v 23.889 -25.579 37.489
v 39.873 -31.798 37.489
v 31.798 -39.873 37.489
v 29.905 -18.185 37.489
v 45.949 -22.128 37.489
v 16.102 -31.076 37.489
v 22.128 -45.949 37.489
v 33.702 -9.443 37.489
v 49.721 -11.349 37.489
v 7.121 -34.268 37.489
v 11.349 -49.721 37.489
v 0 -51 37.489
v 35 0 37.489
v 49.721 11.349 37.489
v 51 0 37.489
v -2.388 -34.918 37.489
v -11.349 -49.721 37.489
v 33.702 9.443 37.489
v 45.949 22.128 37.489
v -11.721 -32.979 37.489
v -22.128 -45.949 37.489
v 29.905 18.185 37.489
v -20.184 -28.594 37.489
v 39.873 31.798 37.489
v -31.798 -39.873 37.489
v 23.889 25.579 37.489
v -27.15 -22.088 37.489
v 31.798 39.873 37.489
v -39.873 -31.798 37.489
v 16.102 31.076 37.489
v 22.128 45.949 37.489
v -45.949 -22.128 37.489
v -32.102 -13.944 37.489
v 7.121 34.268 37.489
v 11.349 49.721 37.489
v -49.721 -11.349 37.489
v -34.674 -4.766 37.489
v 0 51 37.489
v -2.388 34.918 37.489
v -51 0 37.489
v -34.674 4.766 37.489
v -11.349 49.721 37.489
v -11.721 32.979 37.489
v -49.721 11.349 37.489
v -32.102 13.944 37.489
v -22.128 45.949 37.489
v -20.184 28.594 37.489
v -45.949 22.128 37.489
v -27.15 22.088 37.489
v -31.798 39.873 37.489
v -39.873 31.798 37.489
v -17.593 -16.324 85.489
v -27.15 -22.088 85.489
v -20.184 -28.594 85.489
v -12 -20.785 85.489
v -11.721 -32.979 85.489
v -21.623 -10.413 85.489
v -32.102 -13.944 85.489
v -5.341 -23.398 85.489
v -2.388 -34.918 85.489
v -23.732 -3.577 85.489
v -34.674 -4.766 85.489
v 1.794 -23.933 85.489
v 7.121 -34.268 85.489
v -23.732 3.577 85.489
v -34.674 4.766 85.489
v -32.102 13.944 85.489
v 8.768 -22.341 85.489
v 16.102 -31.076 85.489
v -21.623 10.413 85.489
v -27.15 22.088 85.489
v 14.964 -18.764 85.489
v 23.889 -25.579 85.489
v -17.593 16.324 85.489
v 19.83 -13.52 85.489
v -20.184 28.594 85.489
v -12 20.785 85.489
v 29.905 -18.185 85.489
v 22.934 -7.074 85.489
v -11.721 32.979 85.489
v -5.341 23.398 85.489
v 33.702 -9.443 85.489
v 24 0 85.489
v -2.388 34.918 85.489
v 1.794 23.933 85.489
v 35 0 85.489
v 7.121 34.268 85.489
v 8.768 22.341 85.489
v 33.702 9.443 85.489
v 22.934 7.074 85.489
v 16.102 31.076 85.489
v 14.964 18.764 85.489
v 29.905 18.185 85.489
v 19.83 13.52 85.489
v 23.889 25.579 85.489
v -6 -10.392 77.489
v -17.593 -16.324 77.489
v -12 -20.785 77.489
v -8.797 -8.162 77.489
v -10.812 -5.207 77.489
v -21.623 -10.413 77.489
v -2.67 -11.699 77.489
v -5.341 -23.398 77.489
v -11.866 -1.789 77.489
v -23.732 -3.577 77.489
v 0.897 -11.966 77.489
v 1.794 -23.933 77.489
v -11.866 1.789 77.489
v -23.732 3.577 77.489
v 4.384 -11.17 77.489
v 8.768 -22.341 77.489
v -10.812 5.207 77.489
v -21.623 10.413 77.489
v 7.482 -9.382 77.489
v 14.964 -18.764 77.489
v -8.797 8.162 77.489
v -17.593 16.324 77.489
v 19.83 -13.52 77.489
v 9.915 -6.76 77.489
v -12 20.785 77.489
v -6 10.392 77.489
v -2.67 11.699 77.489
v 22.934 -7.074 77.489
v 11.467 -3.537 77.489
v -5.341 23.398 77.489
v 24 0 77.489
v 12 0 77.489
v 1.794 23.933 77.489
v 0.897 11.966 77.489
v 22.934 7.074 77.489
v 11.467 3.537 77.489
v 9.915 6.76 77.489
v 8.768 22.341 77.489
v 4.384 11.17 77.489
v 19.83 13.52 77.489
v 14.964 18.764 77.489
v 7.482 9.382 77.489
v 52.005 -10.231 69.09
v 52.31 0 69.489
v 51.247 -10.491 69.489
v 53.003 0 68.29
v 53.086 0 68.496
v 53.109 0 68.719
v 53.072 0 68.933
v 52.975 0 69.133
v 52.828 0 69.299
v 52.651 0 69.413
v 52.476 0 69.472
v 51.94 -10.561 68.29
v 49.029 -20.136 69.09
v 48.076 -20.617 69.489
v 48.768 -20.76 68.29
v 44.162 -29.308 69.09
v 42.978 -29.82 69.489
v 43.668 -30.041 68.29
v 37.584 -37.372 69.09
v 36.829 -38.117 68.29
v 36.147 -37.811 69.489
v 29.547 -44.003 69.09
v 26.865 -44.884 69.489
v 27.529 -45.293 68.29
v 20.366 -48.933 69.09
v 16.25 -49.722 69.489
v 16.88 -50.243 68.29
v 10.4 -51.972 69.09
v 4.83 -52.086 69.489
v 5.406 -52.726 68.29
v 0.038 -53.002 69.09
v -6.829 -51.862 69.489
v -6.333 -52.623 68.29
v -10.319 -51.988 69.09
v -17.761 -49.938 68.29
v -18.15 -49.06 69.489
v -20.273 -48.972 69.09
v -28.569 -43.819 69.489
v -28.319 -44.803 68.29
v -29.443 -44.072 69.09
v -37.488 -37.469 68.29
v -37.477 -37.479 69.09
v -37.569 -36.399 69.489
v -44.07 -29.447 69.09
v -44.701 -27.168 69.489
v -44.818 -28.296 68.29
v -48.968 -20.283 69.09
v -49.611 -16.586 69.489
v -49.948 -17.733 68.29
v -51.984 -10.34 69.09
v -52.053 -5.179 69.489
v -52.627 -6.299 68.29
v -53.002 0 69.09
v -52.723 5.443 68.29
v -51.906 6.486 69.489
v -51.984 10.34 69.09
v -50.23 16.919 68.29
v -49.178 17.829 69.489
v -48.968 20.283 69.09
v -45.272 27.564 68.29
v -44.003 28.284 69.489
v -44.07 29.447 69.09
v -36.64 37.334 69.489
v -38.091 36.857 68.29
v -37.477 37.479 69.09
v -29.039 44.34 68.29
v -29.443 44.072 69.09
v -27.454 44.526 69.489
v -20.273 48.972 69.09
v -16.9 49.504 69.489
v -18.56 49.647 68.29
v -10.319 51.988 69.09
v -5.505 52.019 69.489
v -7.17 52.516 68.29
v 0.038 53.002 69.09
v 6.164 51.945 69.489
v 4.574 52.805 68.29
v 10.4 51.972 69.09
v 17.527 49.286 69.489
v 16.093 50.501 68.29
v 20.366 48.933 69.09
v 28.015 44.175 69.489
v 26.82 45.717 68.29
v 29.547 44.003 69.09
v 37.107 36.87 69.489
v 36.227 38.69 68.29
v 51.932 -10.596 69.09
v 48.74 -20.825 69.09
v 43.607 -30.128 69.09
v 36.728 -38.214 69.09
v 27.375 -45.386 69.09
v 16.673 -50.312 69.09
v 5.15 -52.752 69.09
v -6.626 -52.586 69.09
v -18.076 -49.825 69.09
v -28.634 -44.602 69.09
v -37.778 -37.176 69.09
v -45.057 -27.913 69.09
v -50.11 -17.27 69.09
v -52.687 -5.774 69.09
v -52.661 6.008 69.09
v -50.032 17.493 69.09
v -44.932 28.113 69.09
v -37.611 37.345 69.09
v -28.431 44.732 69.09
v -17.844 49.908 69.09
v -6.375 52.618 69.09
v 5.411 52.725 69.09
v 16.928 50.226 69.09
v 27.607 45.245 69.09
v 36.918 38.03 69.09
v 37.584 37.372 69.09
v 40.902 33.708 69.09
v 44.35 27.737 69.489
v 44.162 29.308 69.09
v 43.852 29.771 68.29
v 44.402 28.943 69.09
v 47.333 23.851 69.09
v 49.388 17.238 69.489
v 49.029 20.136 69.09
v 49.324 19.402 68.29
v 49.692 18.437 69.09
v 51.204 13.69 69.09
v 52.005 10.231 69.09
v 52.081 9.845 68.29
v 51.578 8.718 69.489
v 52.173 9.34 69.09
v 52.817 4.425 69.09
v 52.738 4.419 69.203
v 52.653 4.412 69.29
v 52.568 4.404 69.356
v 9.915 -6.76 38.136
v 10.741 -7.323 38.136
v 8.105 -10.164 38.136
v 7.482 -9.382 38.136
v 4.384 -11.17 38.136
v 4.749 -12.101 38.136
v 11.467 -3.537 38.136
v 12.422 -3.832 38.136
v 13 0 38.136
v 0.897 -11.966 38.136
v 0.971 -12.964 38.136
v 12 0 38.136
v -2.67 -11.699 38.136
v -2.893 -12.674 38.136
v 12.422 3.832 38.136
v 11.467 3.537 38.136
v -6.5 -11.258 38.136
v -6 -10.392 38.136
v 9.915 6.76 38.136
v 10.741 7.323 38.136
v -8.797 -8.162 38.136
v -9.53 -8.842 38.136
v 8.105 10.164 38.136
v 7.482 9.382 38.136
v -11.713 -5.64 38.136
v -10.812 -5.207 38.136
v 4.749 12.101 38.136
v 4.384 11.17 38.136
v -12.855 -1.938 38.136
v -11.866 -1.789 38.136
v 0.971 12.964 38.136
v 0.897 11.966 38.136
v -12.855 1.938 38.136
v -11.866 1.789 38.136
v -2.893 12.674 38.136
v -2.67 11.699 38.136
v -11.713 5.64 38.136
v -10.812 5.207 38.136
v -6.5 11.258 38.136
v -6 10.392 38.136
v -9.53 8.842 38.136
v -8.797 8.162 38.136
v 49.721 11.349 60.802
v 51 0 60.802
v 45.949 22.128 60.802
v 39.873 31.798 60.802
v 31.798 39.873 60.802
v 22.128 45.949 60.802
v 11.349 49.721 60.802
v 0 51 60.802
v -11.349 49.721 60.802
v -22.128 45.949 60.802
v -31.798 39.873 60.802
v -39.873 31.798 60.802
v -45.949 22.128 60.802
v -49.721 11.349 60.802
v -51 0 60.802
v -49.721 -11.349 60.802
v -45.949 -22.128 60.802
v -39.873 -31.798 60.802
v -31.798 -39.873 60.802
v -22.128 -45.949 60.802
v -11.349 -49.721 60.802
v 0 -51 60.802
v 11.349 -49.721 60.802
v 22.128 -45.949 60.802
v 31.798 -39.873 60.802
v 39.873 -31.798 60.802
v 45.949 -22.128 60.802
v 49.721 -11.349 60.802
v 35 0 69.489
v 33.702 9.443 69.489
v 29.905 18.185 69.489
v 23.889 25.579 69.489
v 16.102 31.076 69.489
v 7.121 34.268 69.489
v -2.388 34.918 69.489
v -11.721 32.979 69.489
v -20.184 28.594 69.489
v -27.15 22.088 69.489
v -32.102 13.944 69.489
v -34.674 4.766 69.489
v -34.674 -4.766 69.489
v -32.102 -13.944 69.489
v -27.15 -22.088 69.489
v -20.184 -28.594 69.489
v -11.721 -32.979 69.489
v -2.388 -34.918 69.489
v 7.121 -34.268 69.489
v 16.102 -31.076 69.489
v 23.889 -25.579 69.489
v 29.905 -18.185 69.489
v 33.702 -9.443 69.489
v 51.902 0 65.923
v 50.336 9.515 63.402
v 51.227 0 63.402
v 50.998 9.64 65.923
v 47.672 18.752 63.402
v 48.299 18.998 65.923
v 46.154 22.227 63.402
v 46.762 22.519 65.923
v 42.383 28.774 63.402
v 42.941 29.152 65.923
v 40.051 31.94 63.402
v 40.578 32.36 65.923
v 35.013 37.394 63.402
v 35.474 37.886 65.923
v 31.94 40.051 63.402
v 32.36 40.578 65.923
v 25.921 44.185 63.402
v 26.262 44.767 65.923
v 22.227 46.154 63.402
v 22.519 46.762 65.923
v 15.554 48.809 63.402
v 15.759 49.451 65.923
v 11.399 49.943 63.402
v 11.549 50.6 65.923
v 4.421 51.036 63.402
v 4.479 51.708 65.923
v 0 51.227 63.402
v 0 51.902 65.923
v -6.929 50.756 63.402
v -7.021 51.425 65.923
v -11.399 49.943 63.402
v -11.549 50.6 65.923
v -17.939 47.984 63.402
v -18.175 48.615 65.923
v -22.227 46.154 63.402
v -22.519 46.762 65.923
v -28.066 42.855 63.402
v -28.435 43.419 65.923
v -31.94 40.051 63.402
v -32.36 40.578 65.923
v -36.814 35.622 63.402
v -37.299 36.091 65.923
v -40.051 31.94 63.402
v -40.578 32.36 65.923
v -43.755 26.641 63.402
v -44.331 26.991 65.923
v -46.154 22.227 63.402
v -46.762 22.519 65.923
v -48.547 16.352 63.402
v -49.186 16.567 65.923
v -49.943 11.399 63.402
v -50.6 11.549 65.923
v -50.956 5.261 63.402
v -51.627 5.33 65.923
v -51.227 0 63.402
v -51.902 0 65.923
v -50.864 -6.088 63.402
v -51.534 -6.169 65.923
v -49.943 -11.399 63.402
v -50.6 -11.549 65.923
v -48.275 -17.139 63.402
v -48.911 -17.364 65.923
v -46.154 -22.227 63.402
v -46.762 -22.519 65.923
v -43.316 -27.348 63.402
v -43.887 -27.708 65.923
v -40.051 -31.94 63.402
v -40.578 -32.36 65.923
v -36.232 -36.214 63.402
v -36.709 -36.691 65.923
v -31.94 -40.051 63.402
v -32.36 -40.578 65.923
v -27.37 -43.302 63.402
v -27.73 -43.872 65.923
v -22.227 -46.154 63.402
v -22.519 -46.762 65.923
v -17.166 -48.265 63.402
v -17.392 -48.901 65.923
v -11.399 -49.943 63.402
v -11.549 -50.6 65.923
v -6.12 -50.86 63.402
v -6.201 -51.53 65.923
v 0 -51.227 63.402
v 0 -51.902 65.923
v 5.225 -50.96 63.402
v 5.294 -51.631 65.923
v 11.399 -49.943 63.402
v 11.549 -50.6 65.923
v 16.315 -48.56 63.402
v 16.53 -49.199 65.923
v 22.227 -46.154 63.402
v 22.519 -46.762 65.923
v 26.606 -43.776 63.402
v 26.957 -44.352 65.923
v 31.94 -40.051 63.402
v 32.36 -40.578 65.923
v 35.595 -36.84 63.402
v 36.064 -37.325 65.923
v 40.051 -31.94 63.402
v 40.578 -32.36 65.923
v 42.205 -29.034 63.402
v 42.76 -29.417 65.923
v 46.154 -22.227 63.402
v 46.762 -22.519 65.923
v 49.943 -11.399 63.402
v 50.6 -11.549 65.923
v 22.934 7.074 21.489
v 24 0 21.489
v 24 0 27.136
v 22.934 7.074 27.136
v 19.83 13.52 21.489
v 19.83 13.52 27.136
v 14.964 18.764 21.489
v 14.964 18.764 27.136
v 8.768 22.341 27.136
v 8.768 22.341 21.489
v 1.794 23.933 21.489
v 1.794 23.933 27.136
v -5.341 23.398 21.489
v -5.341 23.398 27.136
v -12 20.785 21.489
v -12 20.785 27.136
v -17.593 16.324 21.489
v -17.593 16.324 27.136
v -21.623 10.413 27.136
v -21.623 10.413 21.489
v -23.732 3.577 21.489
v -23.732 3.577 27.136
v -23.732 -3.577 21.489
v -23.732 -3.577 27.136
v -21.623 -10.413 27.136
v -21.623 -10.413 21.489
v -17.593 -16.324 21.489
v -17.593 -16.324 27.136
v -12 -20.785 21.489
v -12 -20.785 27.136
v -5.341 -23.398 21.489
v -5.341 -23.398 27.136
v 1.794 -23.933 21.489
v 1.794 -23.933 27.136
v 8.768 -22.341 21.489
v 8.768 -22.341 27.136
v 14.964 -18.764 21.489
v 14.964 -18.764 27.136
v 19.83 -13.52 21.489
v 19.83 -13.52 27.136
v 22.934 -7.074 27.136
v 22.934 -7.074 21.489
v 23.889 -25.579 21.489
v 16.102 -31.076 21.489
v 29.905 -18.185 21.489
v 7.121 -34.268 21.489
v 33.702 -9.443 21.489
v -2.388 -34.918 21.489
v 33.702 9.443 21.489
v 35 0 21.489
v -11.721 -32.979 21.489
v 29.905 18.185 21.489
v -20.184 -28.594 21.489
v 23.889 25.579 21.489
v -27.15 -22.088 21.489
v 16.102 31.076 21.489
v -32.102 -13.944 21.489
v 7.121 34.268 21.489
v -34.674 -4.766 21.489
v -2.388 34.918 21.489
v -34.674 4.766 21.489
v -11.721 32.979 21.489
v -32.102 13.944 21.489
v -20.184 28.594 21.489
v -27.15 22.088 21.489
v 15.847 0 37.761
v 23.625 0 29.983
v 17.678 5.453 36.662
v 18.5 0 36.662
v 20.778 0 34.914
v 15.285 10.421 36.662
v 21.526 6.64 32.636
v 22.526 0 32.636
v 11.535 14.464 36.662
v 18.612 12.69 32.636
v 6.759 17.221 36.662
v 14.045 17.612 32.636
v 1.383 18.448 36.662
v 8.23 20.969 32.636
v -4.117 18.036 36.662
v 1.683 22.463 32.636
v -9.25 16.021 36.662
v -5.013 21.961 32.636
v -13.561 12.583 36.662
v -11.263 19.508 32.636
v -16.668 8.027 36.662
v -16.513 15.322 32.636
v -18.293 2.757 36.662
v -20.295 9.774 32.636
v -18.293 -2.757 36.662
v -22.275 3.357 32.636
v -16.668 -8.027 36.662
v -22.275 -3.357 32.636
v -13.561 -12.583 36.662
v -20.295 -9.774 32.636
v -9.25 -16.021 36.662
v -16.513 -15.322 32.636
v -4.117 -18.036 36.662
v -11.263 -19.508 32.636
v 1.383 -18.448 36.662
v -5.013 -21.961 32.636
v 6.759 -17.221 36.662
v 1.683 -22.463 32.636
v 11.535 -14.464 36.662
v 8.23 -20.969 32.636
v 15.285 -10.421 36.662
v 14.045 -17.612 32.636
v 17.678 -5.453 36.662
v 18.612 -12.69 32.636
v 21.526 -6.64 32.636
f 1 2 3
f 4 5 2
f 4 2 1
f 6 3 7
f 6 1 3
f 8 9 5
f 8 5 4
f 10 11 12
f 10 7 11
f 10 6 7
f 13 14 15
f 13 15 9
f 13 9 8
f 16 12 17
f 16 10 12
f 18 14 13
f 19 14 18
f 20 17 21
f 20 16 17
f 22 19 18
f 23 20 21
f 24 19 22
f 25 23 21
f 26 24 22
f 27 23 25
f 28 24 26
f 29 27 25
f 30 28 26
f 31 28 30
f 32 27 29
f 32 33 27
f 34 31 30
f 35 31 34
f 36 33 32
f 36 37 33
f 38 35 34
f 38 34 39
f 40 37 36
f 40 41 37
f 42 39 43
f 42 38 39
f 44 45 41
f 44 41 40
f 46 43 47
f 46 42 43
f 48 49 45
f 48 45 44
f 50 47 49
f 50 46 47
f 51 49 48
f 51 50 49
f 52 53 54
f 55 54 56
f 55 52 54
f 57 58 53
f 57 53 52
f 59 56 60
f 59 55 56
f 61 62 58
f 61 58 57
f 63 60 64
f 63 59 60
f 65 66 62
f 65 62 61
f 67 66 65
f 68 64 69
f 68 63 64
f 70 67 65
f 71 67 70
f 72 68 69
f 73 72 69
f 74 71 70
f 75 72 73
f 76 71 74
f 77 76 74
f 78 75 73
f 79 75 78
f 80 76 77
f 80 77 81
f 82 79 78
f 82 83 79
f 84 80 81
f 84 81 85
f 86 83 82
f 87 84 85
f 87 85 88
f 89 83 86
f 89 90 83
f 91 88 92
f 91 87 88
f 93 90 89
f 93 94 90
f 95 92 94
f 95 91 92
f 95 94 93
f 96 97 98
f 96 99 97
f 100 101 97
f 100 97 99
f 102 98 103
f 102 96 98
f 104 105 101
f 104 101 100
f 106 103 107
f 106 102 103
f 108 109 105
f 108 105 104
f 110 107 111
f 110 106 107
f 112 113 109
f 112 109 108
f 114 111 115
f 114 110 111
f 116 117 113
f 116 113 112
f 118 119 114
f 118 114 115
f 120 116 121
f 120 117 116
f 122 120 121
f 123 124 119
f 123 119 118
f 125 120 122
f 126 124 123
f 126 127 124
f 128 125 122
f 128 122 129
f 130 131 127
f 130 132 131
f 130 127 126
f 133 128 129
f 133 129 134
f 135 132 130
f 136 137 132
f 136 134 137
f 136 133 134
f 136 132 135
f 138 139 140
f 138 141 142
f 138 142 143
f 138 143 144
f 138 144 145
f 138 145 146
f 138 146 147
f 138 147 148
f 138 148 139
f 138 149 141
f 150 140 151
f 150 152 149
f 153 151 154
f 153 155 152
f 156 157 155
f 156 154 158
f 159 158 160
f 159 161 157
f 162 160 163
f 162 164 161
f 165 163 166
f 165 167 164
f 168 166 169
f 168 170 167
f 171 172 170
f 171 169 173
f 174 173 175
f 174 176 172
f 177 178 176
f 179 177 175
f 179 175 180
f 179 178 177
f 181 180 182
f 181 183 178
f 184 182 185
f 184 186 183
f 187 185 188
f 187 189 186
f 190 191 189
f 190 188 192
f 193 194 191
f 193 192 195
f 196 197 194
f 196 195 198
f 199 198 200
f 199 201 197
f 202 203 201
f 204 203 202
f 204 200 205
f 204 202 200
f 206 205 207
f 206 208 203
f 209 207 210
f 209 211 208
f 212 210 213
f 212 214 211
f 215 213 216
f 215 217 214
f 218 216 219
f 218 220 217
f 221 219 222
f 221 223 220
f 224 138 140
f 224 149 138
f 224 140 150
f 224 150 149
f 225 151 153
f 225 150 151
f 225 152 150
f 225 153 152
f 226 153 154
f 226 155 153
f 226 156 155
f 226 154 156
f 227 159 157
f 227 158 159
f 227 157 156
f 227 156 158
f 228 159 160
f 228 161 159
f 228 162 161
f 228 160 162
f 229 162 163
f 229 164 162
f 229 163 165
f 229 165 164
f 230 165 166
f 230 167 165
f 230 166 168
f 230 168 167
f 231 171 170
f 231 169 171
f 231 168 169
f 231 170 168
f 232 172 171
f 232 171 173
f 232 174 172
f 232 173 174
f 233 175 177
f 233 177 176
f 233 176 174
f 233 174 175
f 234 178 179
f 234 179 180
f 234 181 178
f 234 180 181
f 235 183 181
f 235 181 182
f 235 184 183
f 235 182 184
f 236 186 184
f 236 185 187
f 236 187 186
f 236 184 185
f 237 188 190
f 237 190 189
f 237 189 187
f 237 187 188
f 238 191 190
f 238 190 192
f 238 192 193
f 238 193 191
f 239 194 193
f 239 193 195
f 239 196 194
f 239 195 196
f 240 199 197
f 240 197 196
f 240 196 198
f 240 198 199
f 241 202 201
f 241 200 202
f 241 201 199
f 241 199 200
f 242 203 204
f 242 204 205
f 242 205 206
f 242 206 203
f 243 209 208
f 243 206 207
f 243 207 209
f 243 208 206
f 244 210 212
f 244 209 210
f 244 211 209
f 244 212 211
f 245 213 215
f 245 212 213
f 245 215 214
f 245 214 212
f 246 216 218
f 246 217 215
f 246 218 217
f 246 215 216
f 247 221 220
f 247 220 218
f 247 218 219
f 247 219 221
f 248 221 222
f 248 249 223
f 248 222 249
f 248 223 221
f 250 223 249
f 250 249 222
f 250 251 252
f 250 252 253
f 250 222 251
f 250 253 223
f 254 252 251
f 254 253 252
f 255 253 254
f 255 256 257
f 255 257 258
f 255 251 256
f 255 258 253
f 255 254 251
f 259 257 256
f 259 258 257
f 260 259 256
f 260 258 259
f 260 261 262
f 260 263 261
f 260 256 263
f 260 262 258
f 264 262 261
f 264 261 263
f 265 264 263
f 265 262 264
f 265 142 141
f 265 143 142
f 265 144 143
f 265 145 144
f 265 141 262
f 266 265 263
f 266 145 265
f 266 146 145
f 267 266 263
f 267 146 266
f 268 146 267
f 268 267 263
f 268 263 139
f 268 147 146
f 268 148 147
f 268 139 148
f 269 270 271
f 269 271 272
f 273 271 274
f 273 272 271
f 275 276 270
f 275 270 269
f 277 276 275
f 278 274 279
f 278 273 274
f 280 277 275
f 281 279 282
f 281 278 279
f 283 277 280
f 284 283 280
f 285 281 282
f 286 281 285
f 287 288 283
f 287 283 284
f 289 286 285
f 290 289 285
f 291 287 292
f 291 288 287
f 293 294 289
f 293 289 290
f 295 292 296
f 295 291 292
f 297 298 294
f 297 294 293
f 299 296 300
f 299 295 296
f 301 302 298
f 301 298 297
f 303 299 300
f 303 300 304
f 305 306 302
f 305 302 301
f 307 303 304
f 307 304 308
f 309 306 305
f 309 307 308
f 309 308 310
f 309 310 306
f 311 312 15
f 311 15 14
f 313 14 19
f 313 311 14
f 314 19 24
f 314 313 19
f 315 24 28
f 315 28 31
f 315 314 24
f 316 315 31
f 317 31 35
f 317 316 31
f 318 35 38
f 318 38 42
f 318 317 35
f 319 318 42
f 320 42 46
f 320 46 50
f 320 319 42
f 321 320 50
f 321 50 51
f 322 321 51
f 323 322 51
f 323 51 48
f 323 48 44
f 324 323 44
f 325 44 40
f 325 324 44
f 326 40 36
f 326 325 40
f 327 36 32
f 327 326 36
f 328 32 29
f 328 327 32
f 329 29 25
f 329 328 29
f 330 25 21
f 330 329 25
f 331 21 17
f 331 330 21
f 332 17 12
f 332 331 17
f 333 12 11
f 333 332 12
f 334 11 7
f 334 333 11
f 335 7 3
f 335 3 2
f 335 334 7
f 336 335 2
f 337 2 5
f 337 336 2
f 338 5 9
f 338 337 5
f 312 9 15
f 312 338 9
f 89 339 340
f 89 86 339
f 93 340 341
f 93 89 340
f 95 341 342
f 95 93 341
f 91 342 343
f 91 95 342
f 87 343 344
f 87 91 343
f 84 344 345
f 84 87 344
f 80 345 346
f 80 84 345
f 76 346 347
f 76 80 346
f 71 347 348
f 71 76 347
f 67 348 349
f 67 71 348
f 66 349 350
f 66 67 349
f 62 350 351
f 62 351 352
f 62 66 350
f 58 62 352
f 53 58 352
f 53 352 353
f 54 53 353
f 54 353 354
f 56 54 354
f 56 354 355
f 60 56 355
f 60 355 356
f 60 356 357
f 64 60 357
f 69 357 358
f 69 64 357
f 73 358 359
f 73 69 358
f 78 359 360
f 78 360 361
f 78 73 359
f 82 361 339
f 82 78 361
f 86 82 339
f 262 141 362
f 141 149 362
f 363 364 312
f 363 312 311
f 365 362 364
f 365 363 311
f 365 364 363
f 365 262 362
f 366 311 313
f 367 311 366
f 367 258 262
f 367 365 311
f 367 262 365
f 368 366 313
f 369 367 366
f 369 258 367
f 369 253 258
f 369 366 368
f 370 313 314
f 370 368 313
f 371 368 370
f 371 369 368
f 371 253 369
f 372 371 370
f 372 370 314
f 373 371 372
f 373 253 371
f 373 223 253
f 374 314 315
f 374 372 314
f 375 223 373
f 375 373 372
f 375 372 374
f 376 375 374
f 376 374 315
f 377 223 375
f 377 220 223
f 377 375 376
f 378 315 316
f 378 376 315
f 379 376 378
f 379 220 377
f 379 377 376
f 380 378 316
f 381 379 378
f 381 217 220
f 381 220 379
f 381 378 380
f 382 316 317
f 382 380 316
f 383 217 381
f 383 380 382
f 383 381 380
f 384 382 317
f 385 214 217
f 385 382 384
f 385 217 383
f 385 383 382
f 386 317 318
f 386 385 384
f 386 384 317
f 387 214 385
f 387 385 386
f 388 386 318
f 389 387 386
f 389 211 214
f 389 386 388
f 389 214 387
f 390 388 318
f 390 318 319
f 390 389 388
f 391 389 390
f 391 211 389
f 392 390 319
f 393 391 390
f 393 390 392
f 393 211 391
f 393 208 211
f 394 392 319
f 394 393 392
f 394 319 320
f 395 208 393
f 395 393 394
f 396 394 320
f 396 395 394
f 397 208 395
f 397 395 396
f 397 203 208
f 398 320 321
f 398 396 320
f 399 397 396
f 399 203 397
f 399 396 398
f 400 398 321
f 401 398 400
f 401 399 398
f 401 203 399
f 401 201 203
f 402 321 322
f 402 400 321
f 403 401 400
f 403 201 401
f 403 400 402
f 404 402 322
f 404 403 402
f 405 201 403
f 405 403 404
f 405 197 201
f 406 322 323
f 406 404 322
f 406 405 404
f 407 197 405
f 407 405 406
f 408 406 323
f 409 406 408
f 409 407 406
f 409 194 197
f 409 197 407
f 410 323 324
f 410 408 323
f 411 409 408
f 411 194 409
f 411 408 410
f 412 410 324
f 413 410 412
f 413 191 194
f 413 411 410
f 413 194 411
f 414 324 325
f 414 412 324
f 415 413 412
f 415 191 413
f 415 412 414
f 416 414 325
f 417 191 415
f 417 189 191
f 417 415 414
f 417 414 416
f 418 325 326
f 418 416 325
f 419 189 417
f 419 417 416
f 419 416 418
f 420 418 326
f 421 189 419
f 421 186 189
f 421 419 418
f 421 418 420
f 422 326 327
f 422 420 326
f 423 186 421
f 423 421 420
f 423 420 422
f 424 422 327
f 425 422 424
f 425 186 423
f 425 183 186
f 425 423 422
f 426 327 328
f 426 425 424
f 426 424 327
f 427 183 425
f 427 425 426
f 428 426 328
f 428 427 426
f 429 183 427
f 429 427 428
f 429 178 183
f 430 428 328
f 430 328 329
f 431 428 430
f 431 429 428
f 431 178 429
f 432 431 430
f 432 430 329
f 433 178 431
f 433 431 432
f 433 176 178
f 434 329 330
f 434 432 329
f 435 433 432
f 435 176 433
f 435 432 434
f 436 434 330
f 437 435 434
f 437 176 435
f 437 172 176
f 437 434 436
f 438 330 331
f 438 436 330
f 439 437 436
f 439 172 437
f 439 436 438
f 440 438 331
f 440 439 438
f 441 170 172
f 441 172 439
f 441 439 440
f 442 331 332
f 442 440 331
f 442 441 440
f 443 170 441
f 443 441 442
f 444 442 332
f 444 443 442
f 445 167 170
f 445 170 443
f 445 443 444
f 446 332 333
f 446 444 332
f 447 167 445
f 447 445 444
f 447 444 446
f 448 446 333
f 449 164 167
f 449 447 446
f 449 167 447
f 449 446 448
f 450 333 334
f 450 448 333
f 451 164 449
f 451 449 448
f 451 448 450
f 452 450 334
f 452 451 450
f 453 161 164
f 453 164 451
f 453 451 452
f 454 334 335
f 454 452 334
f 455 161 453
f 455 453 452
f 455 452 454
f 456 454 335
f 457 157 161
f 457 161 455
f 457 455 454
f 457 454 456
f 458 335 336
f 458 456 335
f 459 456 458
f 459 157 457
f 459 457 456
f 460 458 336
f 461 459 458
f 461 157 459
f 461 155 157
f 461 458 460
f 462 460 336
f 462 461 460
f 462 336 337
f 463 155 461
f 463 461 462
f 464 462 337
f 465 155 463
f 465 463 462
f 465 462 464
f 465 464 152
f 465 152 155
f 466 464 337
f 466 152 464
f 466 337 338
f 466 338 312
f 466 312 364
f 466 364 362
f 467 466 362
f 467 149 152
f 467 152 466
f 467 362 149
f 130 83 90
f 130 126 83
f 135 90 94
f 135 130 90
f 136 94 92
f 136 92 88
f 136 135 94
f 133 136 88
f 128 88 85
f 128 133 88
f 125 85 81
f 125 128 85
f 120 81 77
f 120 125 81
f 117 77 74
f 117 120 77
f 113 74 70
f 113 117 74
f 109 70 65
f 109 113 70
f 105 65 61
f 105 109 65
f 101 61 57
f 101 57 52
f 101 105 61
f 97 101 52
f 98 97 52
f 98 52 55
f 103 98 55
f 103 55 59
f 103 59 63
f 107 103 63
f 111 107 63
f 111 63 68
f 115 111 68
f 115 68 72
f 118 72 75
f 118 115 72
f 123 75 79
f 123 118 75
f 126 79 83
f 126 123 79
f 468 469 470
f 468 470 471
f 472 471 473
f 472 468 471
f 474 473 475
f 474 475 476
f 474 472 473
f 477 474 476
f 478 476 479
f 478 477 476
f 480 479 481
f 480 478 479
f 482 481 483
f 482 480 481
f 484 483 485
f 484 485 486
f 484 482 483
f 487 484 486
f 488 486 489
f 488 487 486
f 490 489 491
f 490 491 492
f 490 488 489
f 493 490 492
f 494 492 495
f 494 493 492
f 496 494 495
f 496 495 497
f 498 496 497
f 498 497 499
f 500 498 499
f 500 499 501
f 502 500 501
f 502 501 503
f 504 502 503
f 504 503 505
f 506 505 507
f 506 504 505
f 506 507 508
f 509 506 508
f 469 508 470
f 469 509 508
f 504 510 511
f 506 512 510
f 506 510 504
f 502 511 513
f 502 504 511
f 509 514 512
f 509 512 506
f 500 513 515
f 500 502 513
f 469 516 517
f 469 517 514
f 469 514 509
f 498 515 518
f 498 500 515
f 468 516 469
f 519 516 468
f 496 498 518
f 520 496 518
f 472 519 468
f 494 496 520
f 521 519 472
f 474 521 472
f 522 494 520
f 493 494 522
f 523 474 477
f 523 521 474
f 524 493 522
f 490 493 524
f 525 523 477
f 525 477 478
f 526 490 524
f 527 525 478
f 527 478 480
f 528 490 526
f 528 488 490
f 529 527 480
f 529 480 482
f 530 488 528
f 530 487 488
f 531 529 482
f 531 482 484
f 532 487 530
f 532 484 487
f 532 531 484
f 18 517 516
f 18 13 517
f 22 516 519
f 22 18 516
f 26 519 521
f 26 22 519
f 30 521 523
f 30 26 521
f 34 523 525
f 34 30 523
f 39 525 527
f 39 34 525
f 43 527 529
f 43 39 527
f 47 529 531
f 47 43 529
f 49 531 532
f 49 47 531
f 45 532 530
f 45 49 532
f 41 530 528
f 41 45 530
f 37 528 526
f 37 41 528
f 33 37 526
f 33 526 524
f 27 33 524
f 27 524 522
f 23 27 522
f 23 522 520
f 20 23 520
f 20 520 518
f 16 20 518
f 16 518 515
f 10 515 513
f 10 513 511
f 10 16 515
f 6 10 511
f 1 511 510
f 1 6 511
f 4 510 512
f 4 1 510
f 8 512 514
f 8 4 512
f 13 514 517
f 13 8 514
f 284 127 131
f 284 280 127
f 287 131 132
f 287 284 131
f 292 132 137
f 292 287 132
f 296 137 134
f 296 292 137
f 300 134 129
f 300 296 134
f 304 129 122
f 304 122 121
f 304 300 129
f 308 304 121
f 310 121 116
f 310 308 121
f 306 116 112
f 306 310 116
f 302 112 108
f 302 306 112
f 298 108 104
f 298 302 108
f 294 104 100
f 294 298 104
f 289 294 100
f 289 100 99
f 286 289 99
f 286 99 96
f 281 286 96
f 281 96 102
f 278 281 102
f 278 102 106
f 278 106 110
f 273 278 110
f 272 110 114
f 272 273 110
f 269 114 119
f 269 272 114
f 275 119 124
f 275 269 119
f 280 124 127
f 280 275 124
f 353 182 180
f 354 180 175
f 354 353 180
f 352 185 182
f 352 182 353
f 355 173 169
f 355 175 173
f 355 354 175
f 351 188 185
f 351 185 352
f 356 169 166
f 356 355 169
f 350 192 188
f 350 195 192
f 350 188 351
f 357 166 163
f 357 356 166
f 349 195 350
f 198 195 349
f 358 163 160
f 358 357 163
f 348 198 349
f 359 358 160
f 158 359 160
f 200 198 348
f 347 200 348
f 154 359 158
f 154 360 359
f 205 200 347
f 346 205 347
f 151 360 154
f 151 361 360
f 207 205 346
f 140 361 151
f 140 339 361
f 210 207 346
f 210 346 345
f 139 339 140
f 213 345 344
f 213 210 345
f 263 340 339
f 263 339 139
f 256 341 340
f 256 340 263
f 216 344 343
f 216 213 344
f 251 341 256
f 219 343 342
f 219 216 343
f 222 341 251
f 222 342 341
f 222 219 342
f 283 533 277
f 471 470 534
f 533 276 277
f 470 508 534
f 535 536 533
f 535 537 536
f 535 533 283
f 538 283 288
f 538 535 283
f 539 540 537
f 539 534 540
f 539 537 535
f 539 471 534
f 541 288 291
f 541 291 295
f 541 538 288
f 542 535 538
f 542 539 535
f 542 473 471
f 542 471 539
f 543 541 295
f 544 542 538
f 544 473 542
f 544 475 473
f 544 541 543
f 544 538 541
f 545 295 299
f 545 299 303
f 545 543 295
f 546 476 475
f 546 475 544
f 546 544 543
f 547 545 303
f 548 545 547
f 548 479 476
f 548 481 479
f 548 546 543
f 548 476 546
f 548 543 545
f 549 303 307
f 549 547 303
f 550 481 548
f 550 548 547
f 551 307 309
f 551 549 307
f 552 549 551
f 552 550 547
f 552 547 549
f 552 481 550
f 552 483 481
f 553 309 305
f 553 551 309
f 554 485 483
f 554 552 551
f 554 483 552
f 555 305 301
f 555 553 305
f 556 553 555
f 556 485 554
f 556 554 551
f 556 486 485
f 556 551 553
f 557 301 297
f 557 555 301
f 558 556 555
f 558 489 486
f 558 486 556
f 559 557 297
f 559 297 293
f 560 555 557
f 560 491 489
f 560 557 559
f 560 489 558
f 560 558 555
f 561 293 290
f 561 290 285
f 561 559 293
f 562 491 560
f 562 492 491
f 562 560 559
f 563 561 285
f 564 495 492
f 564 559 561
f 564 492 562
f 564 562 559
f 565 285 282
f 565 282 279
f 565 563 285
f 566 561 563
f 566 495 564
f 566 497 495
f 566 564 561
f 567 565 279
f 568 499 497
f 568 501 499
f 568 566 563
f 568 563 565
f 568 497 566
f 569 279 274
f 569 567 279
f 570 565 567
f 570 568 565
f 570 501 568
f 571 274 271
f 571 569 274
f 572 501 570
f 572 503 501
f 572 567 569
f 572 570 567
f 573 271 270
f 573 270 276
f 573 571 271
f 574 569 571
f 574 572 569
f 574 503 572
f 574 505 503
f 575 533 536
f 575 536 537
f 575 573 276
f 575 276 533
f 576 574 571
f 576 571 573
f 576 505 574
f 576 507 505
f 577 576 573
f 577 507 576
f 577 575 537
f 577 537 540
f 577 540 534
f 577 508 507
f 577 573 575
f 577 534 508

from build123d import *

# Parameters (mm, degrees)
F2_R = 11
F4_R = 0.8


# Not quite as in the source:
# - a fillet or chamfer that OpenCascade refuses, or shapes differently, is made with other operations: its cross-section is extruded or revolved along the edge and cut away or added


with BuildPart() as f1:
    # F0 (on Front) → F1 (revolve)
    with BuildSketch(Plane.XZ):
        Polygon((24, 85.4892928004), (24, 77.4892928004), (12, 77.4892928004), (12, 38.1360072643), (24, 38.1360072643), (24, 21.4892928004), (35, 21.4892928004), (35, 37.4892928004), (51, 37.4892928004), (51, 65.592944622), (51, 69.4892928004), (35, 69.4892928004), (35, 85.4892928004), align=None)
        Polygon((53.7719889283, 69.4892928004), (51, 69.4892928004), (51, 65.592944622), align=None)
    revolve(axis=Axis((0, 0, 48.0438946244), (0, 0, 1)))

    # F2
    f2_edges = [f1.edges().sort_by_distance(p)[0] for p in [
        (-24, 0, 38.136007),
    ]]
    fillet(f2_edges, radius=F2_R)

    # F3: fillet of radius 15 on 1 edges, made by hand


with BuildPart() as f3_tool2:
    # F3_s3 → F3_t4 (revolve)
    with BuildSketch(Plane.XZ):
        with BuildLine():
            ThreePointArc((51, 60.8016097685), (51.7112437374, 65.3657574948), (53.777525929, 69.4970756895))
            Line((53.777525929, 69.4970756895), (51, 65.592944622))
            Line((51, 65.592944622), (51, 60.8016097685))
        make_face()
    revolve(axis=Axis((0, 0, 65.592944622), (0, 0, 1)))

    split(bisect_by=Plane.XY.offset(69.4892928004), keep=Keep.BOTTOM)


with BuildPart() as f1_1:
    add(f1.part)

    # F3_t1: union F3_tool2
    add(f3_tool2.part)

    # F4
    f4_edges = [f1_1.edges().sort_by_distance(p)[0] for p in [
        (-53.771993, 0, 69.489293),
    ]]
    fillet(f4_edges, radius=F4_R)


solid = f1_1.part
